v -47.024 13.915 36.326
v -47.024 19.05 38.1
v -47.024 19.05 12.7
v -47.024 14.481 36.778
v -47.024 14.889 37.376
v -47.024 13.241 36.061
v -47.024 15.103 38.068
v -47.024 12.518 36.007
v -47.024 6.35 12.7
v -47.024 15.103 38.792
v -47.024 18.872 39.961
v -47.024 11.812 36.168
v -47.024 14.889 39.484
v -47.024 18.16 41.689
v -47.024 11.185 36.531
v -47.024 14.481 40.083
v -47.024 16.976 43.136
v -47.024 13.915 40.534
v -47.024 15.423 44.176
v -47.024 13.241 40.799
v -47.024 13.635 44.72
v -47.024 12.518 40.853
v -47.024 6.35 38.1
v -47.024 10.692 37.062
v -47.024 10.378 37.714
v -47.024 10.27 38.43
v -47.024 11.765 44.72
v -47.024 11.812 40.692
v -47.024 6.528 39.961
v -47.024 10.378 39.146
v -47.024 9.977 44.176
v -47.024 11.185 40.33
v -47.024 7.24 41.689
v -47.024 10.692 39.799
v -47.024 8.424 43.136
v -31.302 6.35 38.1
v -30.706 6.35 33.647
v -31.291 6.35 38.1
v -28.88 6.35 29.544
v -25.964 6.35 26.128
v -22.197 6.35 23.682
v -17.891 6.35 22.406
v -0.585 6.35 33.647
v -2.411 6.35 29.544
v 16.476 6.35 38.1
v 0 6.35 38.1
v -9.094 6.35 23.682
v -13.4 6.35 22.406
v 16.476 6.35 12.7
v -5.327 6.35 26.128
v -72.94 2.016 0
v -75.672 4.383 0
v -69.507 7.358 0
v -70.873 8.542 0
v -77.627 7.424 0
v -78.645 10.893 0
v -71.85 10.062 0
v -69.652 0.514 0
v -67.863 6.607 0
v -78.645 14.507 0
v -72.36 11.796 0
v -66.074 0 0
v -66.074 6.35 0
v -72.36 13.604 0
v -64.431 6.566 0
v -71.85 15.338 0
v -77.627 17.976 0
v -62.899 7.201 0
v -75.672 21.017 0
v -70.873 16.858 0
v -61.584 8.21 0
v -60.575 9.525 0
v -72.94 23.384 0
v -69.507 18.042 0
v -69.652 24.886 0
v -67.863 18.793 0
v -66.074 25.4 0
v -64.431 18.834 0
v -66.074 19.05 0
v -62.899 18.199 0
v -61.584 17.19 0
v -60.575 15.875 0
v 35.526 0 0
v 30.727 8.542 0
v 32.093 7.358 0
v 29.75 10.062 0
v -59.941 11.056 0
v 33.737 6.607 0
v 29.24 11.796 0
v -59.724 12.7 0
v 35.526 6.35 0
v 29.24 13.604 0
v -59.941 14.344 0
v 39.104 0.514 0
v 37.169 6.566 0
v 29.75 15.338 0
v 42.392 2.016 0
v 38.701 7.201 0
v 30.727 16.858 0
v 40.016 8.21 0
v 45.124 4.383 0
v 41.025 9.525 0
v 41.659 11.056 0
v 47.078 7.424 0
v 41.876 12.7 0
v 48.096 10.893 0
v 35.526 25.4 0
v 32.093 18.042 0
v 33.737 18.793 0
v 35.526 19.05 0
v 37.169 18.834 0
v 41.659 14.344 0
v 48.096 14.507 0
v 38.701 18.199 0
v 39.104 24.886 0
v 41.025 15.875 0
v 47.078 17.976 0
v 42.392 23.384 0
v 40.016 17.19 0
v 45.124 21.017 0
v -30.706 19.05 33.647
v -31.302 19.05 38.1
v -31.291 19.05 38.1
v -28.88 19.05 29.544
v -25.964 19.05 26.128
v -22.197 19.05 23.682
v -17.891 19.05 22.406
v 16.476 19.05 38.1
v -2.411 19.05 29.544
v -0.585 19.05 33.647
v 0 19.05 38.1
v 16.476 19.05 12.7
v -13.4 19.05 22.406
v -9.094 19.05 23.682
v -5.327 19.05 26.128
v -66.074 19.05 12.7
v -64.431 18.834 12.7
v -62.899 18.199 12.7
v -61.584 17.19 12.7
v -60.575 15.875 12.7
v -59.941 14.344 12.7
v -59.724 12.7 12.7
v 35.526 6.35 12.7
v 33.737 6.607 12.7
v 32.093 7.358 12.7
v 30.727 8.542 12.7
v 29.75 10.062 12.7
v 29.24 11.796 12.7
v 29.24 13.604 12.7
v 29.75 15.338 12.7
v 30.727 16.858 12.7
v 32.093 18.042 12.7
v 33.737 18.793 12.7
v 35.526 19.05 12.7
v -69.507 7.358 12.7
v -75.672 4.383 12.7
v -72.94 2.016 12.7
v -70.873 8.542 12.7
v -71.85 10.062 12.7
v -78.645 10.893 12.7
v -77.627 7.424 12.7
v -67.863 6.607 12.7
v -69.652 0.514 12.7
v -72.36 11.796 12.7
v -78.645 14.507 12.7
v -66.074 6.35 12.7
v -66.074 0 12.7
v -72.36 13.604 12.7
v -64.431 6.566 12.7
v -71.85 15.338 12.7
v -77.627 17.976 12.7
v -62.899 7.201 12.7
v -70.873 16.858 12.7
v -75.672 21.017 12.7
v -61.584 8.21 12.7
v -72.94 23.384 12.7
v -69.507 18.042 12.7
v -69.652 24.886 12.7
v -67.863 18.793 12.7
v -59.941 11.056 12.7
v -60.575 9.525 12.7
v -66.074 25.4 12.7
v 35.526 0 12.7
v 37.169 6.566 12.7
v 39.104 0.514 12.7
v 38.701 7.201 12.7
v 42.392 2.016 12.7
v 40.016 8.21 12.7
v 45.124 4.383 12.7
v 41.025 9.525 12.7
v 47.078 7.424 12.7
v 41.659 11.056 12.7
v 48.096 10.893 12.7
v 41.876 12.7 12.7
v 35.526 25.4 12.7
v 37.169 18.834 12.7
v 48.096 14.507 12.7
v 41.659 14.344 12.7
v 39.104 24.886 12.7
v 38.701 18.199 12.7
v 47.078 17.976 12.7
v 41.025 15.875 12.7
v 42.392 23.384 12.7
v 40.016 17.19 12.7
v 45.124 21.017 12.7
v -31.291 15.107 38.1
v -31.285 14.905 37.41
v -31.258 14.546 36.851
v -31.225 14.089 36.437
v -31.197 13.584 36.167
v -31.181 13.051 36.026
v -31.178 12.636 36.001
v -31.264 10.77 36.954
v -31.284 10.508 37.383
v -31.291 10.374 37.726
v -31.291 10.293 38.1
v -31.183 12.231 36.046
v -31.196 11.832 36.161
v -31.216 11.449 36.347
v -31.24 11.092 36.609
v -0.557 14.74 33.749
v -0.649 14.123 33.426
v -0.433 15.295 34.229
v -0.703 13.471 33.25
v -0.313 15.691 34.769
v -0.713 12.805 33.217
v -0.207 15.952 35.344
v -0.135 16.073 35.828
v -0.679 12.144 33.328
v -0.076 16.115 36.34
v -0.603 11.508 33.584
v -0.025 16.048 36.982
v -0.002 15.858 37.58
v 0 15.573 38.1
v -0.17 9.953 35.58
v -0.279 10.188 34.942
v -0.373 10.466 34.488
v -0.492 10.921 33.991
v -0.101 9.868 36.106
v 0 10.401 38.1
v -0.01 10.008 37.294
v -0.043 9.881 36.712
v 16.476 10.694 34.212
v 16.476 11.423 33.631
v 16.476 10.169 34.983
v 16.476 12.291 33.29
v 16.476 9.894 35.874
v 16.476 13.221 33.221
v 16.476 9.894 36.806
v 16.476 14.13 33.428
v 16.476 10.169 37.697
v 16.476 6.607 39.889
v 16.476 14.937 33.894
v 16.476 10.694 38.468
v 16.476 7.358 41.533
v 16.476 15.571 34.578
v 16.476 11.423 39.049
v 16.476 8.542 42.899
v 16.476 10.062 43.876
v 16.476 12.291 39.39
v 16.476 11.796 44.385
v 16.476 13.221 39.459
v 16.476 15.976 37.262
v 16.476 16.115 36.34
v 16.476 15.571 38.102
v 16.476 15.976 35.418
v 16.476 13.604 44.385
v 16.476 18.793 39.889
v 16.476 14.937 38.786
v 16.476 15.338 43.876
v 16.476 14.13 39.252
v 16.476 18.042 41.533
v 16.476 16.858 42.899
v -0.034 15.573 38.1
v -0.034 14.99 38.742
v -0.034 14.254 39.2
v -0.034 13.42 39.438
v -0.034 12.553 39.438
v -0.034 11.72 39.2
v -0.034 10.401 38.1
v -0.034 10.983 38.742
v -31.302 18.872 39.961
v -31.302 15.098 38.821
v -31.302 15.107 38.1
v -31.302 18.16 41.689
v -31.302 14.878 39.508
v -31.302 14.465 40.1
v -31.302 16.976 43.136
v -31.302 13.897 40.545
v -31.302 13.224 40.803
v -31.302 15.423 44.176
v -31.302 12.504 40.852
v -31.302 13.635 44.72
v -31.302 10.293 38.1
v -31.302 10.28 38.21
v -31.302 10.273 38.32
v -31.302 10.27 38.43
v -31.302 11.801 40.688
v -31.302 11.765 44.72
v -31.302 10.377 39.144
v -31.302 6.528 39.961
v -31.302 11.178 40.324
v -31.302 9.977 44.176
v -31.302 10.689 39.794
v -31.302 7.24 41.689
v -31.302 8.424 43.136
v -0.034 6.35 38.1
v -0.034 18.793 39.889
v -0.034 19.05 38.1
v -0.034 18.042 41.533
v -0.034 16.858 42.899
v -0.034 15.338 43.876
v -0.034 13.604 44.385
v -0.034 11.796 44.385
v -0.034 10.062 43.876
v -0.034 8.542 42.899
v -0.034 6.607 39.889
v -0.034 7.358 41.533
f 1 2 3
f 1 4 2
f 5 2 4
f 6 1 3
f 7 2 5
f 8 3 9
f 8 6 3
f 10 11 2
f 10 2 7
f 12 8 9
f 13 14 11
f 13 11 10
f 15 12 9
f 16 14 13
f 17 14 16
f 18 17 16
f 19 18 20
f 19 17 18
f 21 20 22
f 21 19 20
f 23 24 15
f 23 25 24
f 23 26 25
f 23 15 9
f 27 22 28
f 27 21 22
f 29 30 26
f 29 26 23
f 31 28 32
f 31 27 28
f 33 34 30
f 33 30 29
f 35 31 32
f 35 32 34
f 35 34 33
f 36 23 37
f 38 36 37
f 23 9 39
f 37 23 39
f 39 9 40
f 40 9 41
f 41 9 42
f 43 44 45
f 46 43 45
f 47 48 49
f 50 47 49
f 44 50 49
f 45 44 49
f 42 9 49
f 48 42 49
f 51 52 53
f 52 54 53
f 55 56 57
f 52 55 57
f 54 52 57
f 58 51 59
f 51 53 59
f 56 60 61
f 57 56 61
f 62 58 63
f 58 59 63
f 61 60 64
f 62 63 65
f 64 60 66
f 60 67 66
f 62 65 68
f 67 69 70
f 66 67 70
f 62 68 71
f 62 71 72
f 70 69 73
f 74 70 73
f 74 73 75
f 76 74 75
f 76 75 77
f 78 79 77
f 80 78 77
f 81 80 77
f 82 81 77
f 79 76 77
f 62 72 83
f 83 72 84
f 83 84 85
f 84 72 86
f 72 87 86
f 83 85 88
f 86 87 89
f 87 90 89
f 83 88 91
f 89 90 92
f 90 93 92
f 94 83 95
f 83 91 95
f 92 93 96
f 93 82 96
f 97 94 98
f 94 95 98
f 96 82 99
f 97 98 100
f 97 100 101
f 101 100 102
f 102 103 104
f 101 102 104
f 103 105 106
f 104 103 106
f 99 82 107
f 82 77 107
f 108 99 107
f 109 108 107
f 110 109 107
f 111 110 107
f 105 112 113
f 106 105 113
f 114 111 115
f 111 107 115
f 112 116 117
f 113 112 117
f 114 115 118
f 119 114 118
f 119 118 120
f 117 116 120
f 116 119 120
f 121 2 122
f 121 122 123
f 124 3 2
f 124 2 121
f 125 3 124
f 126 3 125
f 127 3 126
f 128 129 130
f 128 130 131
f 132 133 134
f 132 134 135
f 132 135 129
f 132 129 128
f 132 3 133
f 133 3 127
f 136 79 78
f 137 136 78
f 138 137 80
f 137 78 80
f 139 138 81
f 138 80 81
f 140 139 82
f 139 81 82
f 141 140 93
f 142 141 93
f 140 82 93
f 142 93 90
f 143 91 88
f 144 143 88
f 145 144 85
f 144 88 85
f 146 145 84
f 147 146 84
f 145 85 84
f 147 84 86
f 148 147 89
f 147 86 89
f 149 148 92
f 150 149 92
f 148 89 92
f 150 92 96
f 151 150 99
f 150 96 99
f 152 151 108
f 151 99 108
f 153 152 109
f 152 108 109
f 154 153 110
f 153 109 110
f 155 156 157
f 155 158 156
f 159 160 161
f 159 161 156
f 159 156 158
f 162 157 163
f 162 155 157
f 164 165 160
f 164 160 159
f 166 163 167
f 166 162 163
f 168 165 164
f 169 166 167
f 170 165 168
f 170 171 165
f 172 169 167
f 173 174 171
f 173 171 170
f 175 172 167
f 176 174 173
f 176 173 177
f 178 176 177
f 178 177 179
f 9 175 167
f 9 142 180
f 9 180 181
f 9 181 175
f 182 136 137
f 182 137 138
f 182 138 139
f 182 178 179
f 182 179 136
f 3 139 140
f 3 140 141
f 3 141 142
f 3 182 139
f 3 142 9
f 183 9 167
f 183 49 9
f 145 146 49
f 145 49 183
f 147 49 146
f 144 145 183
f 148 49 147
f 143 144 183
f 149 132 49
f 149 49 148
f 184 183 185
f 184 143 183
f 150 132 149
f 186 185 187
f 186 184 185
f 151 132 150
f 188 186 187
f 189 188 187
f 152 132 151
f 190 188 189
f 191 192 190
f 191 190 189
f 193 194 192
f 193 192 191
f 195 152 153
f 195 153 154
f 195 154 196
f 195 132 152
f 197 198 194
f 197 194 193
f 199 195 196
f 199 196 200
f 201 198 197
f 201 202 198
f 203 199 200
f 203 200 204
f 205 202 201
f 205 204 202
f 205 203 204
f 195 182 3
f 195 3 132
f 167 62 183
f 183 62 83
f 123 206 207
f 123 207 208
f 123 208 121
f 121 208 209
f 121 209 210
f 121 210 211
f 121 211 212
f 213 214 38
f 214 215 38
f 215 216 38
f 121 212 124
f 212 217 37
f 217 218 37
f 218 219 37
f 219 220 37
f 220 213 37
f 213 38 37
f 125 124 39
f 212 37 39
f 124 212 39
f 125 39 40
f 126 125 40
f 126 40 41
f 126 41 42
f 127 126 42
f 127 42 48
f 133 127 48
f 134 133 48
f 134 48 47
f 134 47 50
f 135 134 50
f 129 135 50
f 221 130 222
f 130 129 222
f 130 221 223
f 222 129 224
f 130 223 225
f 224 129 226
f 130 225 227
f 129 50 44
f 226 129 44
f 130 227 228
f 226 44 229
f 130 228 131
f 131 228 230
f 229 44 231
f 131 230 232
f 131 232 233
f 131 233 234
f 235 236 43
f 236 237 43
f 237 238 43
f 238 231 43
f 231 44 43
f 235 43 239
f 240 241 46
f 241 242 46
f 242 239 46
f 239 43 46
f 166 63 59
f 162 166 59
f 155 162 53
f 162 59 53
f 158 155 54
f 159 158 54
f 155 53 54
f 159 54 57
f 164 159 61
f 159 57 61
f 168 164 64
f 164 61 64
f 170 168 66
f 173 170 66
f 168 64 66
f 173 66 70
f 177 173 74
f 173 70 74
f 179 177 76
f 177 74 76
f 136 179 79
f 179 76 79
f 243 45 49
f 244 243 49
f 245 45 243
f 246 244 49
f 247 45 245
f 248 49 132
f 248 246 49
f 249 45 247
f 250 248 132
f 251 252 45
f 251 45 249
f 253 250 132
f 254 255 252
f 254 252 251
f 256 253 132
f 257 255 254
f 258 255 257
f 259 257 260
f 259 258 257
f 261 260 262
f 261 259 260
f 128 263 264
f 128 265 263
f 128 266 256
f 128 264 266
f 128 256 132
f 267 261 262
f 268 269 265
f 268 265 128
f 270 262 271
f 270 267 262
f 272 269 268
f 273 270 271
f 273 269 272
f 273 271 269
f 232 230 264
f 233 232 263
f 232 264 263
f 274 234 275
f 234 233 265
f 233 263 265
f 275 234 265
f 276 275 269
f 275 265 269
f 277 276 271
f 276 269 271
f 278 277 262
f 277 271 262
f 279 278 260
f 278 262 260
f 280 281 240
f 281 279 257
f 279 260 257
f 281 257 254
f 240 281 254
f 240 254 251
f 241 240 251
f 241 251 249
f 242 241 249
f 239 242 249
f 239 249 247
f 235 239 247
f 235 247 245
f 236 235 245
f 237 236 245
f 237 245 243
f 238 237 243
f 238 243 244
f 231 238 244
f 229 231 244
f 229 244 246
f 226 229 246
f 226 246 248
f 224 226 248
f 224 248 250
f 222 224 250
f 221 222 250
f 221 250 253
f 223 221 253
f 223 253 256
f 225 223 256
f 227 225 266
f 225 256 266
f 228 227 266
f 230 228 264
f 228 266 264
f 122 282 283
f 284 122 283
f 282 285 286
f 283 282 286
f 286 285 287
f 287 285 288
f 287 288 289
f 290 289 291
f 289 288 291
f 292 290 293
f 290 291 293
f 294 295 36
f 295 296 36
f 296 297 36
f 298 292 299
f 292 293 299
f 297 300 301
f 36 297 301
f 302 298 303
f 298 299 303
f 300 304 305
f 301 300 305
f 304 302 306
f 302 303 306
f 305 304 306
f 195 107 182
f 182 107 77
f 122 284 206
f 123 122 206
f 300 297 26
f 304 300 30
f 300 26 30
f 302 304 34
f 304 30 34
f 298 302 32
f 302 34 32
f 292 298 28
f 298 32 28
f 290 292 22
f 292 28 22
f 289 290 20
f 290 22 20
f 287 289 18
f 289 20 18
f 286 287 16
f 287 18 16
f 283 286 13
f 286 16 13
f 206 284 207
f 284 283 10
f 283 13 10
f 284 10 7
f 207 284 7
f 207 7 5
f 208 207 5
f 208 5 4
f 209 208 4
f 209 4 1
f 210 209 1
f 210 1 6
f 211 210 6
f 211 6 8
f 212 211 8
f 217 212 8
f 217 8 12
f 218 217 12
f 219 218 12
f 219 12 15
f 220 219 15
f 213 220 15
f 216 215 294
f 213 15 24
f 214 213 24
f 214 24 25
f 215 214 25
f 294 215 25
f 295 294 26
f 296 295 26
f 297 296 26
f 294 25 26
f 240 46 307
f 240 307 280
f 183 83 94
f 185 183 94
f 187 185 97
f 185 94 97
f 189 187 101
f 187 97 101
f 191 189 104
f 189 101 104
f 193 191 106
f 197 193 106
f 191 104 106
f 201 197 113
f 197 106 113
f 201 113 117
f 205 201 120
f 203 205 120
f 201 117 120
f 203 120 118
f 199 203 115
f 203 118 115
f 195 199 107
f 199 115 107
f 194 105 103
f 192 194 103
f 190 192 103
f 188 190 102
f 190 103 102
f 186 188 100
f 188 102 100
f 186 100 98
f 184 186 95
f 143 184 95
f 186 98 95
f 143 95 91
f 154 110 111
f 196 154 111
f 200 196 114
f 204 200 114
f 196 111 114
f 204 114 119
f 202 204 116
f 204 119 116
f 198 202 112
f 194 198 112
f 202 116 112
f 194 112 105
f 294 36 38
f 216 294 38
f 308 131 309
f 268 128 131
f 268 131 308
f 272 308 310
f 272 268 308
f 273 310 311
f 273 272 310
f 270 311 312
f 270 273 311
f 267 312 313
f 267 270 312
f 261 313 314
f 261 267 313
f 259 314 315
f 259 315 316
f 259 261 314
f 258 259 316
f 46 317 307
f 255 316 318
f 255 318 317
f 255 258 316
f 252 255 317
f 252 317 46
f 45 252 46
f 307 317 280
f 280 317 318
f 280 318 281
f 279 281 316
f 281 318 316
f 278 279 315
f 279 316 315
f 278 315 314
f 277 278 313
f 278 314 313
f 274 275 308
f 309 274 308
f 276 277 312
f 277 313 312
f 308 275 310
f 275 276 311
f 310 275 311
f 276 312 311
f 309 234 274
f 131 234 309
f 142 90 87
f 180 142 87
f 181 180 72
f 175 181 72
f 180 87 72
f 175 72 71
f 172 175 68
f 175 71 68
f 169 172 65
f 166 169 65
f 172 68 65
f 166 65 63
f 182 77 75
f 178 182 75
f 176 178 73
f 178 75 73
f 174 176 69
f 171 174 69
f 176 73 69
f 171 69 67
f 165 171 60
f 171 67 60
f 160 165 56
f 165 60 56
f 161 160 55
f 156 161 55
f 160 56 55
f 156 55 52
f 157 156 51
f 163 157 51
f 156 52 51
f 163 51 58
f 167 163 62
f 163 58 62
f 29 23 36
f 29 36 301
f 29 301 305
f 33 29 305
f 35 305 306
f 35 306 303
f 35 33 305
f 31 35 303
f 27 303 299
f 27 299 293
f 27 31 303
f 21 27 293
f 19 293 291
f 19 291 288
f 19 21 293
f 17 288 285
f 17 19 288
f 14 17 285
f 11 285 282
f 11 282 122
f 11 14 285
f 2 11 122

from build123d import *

# Parameters (mm, degrees)
F1_DEPTH  = 12.7
F2_W      = 63.5
F2_H      = 12.7
F3_DEPTH  = 25.4
F5_DEPTH  = 25.4
F8_DEPTH  = 15.7226
F9_DEPTH  = 16.51
F11_R     = 3.127999
F12_DEPTH = 25.4
F10_R     = 2.429756
F13_DEPTH = 25.4


with BuildPart() as f1:
    # F0 (on Top) → F1 (new body)
    with BuildSketch(Plane.XY):
        with BuildLine():
            Line((35.525675, 25.4), (-66.074325, 25.4))
            Line((-66.074325, 25.4), (-66.074325, 19.05))
            ThreePointArc((-66.074325, 19.05), (-61.584197, 17.190128), (-59.724325, 12.7))
            ThreePointArc((-59.724325, 12.7), (-61.584197, 8.209872), (-66.074325, 6.35))
            Line((-66.074325, 6.35), (-66.074325, 0))
            Line((-66.074325, 0), (35.525675, 0))
            Line((35.525675, 0), (35.525675, 6.35))
            ThreePointArc((35.525675, 6.35), (29.175675, 12.7), (35.525675, 19.05))
            Line((35.525675, 19.05), (35.525675, 25.4))
        make_face()
        Polygon((-47.024325, 6.35), (-47.024325, 12.7), (-47.024325, 19.05), (16.475675, 19.05), (16.475675, 6.35), align=None, mode=Mode.SUBTRACT)
        with BuildLine():
            Line((-66.074325, 19.05), (-66.074325, 25.4))
            ThreePointArc((-66.074325, 25.4), (-78.774325, 12.7), (-66.074325, 0))
            Line((-66.074325, 0), (-66.074325, 6.35))
            ThreePointArc((-66.074325, 6.35), (-72.424325, 12.7), (-66.074325, 19.05))
        make_face()
        with BuildLine():
            ThreePointArc((35.525675, 0), (48.225675, 12.7), (35.525675, 25.4))
            Line((35.525675, 25.4), (35.525675, 19.05))
            ThreePointArc((35.525675, 19.05), (40.015803, 17.190128), (41.875675, 12.7))
            ThreePointArc((41.875675, 12.7), (40.015803, 8.209872), (35.525675, 6.35))
            Line((35.525675, 6.35), (35.525675, 0))
        make_face()
        Polygon((-47.024325, 19.05), (-47.024325, 12.7), (-47.024325, 6.35), (16.475675, 6.35), (16.475675, 19.05), align=None)
    extrude(amount=F1_DEPTH)

    # F2 (on face) → F3 (join)
    with BuildSketch(Plane.XY.offset(12.7)):
        with Locations((-15.274325, 12.7)):
            Rectangle(F2_W, F2_H)
    extrude(amount=F3_DEPTH)

    # F4 (on face) → F5 (cut)
    with BuildSketch(Plane.XZ.offset(-6.35)):
        with BuildLine():
            Line((0, 38.1), (-31.290911, 38.1))
            ThreePointArc((-31.290911, 38.1), (-15.645456, 22.243986), (0, 38.1))
        make_face()
    extrude(amount=-F5_DEPTH, mode=Mode.SUBTRACT)

    # F7 (on face) → F8 (join)
    with BuildSketch(Plane(origin=(-47.024325, 0, 0), x_dir=(0, -1, 0), z_dir=(-1, 0, 0))):
        with BuildLine():
            Line((-19.05, 38.1), (-6.35, 38.1))
            ThreePointArc((-6.35, 38.1), (-12.7, 44.788843), (-19.05, 38.1))
        make_face()
    extrude(amount=-F8_DEPTH)

    # F6 (on face) → F9 (join)
    with BuildSketch(Plane.YZ.offset(16.475675)):
        with BuildLine():
            Line((6.35, 38.1), (19.05, 38.1))
            ThreePointArc((19.05, 38.1), (12.7, 44.45), (6.35, 38.1))
        make_face()
    extrude(amount=-F9_DEPTH)

    # F11 (on face) → F12 (cut)
    with BuildSketch(Plane.YZ.offset(16.475675)):
        with Locations((12.986762, 36.340035)):
            Circle(F11_R)
    extrude(amount=-F12_DEPTH, mode=Mode.SUBTRACT)

    # F10 (on face) → F13 (cut)
    with BuildSketch(Plane(origin=(-47.024325, 0, 0), x_dir=(0, -1, 0), z_dir=(-1, 0, 0))):
        with Locations((-12.7, 38.430261)):
            Circle(F10_R)
    extrude(amount=-F13_DEPTH, mode=Mode.SUBTRACT)


solid = f1.part
